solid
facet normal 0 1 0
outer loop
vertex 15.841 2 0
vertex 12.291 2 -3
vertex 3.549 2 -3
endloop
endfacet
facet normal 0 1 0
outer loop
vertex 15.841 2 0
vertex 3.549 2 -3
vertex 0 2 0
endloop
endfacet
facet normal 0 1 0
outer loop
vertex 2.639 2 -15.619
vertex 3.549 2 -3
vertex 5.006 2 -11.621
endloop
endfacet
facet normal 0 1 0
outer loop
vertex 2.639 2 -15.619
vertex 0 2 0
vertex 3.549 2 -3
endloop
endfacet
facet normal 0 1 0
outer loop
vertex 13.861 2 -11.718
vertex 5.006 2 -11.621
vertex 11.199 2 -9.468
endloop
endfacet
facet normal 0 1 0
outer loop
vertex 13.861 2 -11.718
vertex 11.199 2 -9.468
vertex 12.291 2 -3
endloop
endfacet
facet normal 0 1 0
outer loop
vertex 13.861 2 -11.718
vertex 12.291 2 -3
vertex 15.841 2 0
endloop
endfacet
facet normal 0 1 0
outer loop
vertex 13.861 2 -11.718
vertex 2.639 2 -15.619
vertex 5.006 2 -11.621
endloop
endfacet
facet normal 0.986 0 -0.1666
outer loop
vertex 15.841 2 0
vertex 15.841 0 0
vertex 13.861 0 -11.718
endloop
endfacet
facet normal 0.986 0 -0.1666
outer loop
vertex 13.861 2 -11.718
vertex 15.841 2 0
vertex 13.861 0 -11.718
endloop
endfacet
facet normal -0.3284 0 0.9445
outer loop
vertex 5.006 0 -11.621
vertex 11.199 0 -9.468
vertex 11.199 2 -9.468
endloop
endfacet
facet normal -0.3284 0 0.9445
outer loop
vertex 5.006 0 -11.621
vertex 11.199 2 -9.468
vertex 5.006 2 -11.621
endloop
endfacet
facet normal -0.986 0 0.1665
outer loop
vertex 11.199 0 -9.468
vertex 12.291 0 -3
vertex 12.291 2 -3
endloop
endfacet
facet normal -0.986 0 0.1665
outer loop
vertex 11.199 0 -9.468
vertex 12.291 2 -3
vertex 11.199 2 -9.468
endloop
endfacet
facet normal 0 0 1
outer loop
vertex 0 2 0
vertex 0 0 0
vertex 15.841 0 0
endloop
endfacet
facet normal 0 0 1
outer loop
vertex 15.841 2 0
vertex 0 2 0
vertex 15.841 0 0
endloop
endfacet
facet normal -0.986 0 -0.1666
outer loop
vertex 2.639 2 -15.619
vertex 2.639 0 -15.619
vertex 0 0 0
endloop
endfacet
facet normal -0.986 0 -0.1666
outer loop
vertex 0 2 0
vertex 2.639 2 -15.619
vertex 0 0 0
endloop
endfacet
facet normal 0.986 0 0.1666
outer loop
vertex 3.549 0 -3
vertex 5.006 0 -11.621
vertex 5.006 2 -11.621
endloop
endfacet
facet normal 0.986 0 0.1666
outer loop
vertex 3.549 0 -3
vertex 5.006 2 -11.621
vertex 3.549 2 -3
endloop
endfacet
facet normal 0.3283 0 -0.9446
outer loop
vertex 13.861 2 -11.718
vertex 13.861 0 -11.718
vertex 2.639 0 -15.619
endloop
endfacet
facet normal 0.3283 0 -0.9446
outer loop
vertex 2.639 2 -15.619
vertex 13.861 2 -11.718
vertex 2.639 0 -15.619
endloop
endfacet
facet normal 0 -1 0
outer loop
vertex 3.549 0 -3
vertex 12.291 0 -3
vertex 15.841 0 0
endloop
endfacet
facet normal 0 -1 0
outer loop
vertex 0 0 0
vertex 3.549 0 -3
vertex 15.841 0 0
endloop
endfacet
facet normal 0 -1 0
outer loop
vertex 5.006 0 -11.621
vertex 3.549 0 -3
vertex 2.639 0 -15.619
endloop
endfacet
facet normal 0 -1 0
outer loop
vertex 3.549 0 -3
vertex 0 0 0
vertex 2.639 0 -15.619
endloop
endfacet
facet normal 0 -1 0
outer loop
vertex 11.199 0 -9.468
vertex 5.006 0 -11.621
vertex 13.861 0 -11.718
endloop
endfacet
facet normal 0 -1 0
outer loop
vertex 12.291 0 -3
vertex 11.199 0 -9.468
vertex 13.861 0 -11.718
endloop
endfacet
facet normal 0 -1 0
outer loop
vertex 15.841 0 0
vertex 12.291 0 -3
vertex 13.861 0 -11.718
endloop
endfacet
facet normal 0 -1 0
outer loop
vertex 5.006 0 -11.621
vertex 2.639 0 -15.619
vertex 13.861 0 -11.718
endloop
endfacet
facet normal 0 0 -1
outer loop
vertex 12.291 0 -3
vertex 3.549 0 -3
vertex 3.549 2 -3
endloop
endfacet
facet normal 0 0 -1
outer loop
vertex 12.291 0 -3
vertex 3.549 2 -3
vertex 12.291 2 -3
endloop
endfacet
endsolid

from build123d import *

# Parameters (mm, degrees)
BOSS_EXTRUDE1_DEPTH = 2


with BuildPart() as part:
    # Sketch1 → Boss-Extrude1 (new body)
    with BuildSketch(Plane(origin=(0, 0, 0), x_dir=(1, 0, 0), z_dir=(0, 1, 0))):
        Polygon((0, 0), (15.84078026, 0), (13.860874637, 11.718342674), (2.63902101, 15.619407394), align=None)
        Polygon((5.005894234, 11.620506435), (3.549392266, 3), (12.291387994, 3), (11.198615402, 9.467724294), align=None, mode=Mode.SUBTRACT)
    extrude(amount=BOSS_EXTRUDE1_DEPTH)


solid = part.part
